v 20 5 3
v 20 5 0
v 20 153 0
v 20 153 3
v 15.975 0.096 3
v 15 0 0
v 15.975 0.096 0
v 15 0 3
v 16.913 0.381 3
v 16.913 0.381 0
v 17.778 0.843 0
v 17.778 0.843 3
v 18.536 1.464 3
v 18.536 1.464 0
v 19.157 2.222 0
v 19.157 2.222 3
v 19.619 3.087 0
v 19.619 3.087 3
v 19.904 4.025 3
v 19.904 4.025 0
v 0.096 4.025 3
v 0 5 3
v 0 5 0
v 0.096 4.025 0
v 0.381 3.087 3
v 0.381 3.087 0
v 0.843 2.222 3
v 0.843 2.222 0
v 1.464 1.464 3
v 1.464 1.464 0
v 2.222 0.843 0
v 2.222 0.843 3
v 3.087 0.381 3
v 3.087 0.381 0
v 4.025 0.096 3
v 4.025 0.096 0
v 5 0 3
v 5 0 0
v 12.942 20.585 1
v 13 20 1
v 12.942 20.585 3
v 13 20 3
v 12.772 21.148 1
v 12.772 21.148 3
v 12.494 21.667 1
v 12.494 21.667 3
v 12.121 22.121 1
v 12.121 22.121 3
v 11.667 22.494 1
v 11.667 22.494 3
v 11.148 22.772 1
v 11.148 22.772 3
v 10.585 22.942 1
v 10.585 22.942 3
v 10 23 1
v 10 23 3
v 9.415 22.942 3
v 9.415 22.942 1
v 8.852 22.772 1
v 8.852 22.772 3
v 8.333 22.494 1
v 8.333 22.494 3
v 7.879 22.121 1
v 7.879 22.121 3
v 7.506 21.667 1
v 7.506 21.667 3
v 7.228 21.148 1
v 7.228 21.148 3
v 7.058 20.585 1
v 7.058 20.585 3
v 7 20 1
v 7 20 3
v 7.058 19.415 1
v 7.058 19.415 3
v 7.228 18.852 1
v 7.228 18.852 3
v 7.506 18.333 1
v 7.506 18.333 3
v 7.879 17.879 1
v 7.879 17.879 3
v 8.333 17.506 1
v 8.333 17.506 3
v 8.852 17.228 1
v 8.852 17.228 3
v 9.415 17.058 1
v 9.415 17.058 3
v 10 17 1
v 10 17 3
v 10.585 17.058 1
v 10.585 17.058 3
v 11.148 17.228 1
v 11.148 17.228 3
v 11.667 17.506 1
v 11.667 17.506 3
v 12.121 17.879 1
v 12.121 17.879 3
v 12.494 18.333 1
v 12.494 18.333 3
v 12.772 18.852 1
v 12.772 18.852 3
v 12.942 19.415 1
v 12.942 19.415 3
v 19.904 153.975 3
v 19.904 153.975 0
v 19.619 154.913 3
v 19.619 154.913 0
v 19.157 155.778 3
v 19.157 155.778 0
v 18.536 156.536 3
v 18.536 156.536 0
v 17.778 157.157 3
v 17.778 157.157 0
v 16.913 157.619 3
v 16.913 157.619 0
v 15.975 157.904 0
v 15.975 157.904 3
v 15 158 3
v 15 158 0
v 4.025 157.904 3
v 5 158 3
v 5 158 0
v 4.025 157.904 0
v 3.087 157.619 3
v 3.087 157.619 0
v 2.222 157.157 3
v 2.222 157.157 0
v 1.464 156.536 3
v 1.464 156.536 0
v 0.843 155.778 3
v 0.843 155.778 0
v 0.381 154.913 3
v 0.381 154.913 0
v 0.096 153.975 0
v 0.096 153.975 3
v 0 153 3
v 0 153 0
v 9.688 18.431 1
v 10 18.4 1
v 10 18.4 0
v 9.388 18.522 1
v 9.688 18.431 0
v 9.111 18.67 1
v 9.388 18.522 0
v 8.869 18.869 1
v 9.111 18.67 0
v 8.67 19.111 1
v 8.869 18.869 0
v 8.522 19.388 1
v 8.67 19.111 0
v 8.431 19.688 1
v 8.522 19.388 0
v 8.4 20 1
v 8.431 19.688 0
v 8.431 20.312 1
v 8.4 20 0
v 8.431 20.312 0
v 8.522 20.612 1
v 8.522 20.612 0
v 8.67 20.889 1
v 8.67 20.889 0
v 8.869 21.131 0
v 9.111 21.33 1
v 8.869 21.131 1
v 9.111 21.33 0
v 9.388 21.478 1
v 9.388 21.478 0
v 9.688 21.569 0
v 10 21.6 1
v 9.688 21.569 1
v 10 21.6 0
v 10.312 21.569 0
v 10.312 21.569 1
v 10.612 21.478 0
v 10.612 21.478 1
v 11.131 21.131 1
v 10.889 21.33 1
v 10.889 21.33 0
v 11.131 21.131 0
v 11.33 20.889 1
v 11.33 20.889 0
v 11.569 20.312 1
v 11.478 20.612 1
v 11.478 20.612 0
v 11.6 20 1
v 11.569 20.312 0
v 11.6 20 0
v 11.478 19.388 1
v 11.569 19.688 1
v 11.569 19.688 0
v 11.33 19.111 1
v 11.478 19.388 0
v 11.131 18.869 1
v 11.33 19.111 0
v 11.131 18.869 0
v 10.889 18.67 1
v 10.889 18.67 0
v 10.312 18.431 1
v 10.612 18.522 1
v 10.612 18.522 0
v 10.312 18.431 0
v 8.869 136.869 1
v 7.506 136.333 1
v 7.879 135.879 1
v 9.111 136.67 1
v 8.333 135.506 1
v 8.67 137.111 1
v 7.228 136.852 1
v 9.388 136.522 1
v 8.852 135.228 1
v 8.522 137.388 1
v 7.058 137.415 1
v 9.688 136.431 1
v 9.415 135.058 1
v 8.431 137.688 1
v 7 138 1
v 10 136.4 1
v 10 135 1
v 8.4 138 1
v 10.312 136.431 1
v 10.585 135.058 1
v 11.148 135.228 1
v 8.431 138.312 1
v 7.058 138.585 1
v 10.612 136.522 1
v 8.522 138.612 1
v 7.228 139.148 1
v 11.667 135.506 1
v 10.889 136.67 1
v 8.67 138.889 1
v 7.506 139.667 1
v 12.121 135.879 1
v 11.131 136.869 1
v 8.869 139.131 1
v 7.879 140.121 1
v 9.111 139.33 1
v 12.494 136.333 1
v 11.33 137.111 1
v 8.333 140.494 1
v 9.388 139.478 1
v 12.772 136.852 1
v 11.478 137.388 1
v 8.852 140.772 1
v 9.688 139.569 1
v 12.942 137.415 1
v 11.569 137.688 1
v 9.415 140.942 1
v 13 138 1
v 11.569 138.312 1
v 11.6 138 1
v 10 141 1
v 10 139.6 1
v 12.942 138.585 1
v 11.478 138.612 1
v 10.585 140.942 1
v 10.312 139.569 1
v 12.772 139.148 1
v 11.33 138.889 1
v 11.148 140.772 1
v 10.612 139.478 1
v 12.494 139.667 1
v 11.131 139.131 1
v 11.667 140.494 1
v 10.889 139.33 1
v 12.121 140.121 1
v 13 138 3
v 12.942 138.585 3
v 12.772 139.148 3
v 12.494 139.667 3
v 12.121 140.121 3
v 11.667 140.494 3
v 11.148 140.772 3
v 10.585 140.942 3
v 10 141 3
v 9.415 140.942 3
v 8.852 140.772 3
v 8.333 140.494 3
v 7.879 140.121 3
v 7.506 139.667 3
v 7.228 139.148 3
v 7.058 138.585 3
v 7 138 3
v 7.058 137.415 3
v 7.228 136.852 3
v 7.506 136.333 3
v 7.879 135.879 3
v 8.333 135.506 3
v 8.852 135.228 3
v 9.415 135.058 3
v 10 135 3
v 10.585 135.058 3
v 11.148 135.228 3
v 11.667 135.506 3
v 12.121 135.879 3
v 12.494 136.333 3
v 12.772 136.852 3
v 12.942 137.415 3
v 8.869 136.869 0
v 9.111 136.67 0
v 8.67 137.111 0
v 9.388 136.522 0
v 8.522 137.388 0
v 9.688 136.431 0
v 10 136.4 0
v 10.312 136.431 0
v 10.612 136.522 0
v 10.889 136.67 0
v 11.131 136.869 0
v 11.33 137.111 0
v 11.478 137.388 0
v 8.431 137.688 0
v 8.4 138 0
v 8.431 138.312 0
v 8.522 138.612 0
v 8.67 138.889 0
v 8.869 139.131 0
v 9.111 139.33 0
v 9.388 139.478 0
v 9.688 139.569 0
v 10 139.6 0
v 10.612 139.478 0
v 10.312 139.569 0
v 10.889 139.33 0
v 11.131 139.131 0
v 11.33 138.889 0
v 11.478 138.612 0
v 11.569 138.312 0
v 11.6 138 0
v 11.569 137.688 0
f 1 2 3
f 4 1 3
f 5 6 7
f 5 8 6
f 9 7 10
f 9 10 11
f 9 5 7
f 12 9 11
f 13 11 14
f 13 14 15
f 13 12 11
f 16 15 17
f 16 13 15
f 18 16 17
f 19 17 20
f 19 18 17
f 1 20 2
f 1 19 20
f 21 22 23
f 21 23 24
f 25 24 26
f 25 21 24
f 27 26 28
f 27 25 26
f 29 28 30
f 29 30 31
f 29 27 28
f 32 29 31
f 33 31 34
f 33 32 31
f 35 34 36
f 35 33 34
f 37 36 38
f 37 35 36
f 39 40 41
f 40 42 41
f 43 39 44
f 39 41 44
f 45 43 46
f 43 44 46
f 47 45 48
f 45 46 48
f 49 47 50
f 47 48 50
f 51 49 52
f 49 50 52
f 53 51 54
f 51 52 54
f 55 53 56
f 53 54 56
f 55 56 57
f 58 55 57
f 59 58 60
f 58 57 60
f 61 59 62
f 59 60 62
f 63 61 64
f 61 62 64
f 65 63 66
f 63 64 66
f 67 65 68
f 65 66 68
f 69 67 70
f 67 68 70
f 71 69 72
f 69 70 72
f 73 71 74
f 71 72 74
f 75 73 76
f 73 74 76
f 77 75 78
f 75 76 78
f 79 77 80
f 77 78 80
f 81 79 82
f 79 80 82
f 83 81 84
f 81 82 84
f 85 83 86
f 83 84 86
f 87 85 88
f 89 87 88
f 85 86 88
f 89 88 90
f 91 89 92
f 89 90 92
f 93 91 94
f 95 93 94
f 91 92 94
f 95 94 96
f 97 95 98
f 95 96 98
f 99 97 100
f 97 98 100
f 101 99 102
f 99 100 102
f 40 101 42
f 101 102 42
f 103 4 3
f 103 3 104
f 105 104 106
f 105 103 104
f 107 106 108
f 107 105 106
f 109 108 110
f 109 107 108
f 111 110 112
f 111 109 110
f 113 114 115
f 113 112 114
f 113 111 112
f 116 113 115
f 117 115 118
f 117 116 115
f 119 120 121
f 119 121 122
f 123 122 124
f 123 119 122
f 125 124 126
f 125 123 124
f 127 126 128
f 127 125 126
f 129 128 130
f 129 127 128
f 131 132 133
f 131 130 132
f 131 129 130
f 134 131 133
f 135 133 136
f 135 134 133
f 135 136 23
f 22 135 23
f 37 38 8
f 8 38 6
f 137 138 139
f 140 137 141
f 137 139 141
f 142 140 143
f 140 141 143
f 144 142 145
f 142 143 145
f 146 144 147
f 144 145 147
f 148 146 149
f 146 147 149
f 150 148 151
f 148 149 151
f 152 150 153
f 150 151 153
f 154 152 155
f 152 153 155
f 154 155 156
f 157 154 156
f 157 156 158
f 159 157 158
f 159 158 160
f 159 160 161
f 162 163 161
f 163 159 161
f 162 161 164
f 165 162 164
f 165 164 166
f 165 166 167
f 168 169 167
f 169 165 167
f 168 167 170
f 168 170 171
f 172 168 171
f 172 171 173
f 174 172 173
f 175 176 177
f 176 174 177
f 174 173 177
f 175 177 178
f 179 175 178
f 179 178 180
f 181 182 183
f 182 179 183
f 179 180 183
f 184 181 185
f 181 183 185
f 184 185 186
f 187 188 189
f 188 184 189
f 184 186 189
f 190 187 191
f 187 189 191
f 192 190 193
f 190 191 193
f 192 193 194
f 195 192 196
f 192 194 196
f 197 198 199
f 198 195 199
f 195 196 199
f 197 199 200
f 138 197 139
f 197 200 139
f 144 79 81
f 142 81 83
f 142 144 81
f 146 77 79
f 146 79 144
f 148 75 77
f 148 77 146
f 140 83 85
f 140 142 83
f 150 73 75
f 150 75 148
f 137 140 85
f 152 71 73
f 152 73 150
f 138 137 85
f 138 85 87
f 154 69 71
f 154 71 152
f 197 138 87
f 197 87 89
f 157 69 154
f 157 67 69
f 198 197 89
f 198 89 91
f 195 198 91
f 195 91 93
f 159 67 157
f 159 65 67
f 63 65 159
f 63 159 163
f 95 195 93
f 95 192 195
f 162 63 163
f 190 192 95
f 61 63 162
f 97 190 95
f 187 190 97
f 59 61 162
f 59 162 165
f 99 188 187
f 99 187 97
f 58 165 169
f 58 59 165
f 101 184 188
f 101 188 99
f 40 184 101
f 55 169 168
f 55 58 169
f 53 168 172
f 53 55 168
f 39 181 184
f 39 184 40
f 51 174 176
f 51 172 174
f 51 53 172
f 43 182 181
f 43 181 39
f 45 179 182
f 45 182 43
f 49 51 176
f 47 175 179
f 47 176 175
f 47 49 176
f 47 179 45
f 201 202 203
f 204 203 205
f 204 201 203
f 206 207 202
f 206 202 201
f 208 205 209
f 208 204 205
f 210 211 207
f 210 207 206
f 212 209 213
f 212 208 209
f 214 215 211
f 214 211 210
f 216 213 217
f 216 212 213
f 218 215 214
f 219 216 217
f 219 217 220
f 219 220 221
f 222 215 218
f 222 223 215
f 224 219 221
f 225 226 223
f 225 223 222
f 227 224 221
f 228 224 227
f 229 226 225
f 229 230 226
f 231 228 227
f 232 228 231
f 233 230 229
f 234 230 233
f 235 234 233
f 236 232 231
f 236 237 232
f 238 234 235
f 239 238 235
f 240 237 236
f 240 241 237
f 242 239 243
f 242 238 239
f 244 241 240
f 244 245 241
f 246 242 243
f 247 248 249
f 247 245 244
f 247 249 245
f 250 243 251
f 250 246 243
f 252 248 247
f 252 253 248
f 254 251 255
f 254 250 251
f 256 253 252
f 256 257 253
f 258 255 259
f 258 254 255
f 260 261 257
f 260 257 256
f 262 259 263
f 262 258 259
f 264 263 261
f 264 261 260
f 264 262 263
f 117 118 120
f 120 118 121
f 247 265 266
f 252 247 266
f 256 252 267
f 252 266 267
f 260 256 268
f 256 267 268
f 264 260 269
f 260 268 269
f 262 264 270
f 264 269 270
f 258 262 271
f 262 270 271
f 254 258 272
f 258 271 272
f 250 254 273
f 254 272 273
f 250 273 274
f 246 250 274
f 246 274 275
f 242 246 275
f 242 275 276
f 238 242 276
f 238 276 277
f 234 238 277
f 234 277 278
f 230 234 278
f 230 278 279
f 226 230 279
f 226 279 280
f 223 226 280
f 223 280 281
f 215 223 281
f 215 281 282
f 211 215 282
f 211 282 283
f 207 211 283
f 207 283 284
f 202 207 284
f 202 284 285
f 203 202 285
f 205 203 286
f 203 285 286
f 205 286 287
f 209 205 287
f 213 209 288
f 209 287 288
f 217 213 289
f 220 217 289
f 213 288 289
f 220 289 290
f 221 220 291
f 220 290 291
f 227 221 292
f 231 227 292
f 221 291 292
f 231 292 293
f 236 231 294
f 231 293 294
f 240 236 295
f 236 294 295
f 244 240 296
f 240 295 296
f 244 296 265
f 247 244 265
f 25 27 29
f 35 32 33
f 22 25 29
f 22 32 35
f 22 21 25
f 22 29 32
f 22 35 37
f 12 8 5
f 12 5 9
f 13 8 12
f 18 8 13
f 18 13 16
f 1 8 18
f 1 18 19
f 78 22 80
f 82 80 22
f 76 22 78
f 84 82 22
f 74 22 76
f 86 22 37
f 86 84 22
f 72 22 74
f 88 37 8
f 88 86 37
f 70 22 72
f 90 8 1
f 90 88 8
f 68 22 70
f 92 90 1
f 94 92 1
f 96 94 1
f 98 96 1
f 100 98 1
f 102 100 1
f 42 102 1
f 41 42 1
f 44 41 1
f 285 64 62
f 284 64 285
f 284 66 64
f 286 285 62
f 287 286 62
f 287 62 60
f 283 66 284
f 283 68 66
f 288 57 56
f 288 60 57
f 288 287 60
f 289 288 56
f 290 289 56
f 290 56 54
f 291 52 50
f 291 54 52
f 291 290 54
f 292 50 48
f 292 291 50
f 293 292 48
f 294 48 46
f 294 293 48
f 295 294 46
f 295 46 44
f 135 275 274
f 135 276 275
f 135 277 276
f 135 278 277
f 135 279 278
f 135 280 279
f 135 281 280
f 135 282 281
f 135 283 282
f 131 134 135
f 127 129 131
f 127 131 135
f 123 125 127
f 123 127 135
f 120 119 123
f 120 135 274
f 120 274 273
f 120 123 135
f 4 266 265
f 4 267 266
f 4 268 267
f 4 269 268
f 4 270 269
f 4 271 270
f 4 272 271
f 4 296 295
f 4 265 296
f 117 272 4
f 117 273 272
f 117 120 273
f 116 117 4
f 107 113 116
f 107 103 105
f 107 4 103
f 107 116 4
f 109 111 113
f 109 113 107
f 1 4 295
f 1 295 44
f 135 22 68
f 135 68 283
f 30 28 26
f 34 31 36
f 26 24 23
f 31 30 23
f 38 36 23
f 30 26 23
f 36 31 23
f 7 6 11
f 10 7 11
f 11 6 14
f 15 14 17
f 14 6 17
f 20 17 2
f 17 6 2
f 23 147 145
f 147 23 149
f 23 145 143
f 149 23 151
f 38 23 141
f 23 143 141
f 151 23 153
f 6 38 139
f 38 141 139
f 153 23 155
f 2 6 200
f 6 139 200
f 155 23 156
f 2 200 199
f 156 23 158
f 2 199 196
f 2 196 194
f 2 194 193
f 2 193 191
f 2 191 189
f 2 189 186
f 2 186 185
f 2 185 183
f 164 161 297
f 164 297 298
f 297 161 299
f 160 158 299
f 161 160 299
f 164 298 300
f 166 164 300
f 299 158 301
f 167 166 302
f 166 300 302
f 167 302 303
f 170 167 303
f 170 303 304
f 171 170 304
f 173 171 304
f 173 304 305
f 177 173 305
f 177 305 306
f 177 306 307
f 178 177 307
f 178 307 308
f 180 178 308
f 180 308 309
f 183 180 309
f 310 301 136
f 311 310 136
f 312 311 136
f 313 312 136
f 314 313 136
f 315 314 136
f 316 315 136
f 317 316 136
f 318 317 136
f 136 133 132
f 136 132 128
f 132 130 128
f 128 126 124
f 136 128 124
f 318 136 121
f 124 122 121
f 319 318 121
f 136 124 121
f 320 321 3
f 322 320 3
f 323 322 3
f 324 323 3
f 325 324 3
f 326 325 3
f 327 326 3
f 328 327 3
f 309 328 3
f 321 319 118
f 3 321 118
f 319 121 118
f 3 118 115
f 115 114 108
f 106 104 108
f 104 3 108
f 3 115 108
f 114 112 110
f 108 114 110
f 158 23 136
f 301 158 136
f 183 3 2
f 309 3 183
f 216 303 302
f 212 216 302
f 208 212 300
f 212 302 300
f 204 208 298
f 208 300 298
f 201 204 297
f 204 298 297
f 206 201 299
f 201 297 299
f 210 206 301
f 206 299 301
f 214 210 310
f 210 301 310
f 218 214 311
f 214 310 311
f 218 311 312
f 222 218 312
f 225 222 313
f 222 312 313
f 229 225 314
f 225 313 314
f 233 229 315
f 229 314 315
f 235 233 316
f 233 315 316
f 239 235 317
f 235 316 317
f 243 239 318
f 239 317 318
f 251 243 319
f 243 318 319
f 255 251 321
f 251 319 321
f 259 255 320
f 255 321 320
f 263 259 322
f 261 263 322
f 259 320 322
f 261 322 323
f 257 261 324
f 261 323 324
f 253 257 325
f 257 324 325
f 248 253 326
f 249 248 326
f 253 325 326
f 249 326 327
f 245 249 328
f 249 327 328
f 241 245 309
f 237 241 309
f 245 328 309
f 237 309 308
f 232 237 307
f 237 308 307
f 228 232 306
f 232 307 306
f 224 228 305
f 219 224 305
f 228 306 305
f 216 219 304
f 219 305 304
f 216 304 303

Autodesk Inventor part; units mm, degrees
ref_plane "YZ Plane" through (0, 0, 0) normal (1, 0, 0) x (0, 1, 0)
ref_plane "XZ Plane" through (0, 0, 0) normal (0, 1, 0) x (-1, 0, 0)
ref_plane "XY Plane" through (0, 0, 0) normal (0, 0, 1) x (1, 0, 0)
sketch "スケッチ1" plane through (0, 0, 0) normal (0, 0, 1) x (1, 0, 0)
  line L0 (0, 0) -> (20, 0)
  line L1 (20, 0) -> (20, 158)
  line L2 (20, 158) -> (0, 158)
  line L3 (0, 158) -> (0, 0)
  dimension "d0" = 158
  dimension "d1" = 20
extrude "押し出し1" add sketch "スケッチ1" along normal blind 3
sketch "スケッチ2" plane through (0, 0, 3) normal (0, 0, 1) x (1, 0, 0)
  line L0 (0, 0) -> (20, 0) projected
  line L1 (20, 0) -> (20, 158) projected
  point P0 (10, 138)
  point P1 (10, 20)
  dimension "d4" = 20
  dimension "d5" = 118
  dimension "d6" = 10
  dimension "d7" = 10
hole "穴1" at (10, 138, 3) at (10, 20, 3) direction (0, 0, -1) diameter 3.2 depth 8
sketch "スケッチ3" plane through (0, 0, 3) normal (0, 0, 1) x (1, 0, 0)
  circle A0 centre (10, 20) radius 1.6 projected
  circle A1 centre (10, 138) radius 1.6 projected
  line L0 (20, 0) -> (20, 158) projected
  line L1 (20, 158) -> (0, 158) projected
  line L2 (0, 158) -> (0, 0) projected
  line L3 (0, 0) -> (20, 0) projected
  circle A2 centre (10, 138) radius 3
  circle A3 centre (10, 20) radius 3
  dimension "d15" = 6
  dimension "d16" = 6
extrude "押し出し2" cut sketch "スケッチ3" against normal blind 2 contours A1 | A2 | A3
fillet "フィレット1" radius 5 4 edges at (0, 158, 1.5) (20, 158, 1.5) (0, 0, 1.5) (20, 0, 1.5)
equation "\"d7\" = d6"
equation "\"d16\" = d15"
properties part number "BP_BOX-Bar"
